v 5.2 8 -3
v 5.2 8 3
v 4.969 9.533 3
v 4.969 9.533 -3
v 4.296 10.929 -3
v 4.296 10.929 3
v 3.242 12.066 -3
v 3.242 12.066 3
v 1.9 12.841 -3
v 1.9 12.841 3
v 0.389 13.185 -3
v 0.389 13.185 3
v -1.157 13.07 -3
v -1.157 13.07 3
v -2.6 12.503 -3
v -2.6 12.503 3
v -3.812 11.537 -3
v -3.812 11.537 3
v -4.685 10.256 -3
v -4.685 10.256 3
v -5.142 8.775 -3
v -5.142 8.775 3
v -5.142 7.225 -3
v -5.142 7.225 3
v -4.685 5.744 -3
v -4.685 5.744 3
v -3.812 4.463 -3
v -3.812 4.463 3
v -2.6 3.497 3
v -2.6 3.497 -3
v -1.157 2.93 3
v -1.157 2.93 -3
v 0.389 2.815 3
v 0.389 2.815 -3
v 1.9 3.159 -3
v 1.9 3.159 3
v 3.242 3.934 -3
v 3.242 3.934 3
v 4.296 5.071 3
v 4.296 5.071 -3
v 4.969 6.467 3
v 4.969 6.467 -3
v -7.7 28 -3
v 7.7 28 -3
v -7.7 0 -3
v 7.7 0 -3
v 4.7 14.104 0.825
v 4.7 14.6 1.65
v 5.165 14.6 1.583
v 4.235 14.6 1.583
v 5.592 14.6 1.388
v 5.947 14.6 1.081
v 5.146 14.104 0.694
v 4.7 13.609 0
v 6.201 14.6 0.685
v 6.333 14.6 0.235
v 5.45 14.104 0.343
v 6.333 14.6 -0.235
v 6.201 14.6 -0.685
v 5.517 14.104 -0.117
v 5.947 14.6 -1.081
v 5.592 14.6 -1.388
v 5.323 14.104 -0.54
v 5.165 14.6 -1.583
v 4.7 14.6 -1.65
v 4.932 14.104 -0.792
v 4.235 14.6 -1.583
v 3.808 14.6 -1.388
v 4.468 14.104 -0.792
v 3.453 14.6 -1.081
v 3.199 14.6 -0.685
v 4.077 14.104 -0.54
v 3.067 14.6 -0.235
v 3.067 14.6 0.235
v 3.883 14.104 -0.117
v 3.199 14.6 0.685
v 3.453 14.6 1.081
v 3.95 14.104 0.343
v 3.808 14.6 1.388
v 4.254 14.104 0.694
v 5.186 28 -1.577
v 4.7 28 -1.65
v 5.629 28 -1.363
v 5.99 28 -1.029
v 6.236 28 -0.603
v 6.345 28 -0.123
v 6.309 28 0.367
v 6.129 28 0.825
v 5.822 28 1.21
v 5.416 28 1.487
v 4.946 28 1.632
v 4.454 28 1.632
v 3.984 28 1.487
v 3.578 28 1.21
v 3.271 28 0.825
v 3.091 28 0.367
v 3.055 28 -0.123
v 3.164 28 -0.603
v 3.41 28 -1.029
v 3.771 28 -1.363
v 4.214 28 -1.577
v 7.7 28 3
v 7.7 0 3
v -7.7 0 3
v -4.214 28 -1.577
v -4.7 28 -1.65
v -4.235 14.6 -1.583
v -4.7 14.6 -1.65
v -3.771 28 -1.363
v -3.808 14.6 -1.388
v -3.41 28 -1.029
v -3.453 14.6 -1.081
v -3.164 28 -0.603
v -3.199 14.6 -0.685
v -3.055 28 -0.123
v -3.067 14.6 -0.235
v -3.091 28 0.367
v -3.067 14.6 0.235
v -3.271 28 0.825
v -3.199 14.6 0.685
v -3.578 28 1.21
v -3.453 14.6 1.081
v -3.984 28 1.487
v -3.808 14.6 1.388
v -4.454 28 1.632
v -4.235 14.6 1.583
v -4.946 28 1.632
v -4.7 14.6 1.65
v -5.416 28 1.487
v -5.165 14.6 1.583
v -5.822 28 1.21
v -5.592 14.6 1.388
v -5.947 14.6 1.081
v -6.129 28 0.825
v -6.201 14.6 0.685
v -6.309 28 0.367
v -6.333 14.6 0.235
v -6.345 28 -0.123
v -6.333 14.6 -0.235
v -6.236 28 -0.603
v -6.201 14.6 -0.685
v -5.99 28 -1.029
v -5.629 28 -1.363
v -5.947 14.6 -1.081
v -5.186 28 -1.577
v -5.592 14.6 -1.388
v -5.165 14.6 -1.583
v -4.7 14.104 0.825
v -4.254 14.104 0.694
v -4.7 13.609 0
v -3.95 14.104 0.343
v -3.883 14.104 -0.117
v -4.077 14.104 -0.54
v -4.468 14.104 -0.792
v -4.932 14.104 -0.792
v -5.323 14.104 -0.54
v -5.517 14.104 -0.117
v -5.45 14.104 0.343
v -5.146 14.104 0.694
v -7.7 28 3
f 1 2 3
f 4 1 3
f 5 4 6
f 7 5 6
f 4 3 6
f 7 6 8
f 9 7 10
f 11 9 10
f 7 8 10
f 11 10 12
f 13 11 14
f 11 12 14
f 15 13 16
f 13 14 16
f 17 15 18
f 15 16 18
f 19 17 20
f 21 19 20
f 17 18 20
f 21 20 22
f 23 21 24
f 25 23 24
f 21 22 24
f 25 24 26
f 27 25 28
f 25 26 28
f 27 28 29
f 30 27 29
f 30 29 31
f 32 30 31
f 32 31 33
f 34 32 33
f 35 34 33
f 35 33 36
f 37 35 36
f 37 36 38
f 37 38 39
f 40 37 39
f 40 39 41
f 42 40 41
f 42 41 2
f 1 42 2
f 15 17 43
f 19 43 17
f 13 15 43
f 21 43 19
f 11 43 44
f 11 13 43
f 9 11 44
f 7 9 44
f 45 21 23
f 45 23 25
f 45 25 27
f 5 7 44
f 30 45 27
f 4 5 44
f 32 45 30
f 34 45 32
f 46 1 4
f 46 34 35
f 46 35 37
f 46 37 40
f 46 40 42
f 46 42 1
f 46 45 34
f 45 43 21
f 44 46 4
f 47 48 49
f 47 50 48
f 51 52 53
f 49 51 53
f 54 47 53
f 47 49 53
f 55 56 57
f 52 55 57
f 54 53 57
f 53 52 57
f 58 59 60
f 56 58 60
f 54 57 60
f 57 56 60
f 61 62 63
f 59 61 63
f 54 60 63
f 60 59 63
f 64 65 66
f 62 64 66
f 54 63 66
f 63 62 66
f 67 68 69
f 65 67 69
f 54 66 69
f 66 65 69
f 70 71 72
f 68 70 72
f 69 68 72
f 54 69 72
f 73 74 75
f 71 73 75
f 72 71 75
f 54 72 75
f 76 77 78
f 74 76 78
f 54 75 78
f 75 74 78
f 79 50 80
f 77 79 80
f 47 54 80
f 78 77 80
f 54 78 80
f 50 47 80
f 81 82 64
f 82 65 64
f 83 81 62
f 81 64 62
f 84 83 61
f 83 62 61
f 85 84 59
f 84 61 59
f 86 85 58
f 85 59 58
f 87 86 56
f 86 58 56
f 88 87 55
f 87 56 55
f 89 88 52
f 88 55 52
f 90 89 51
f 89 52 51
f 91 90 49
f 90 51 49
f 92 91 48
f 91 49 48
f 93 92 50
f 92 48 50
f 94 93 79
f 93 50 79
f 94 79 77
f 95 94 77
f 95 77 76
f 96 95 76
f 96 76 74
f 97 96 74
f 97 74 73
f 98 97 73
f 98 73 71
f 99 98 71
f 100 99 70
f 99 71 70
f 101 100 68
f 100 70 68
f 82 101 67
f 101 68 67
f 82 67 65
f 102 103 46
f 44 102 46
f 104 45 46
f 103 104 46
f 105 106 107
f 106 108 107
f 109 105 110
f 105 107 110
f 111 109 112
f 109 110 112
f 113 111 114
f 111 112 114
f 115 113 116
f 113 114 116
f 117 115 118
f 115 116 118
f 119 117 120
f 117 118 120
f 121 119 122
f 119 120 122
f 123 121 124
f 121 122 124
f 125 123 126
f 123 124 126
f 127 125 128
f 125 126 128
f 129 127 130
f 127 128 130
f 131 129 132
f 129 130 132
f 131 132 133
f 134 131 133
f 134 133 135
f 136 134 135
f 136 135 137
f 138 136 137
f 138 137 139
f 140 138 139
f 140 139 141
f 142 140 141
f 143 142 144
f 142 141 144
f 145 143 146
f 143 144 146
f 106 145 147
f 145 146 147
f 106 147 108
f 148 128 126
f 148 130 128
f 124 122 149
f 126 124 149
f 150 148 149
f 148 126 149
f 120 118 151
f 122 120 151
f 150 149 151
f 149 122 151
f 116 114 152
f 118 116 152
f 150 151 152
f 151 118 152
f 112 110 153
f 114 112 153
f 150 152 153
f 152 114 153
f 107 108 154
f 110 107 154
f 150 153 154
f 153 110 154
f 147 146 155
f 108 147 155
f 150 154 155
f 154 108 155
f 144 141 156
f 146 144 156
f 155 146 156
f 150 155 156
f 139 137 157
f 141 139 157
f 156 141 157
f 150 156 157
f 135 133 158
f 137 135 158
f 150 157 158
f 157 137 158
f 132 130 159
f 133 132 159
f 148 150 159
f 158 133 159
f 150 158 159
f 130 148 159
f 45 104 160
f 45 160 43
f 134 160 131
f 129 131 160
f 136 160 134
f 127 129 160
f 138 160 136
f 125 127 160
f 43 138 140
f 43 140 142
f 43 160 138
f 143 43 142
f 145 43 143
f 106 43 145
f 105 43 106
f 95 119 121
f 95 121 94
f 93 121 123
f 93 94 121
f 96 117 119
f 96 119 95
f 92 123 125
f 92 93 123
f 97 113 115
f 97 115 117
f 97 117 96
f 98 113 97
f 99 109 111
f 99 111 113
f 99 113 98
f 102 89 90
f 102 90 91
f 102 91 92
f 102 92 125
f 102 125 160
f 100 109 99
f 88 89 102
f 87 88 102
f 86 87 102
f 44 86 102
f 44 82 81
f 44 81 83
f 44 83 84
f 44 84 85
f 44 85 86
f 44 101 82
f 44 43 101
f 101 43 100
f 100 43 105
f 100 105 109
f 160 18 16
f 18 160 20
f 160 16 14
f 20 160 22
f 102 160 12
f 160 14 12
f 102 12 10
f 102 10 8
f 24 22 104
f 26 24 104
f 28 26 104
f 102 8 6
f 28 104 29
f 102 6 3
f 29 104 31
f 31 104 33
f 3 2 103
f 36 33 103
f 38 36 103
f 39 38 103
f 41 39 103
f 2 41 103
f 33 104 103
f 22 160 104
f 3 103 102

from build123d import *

# Parameters (mm, degrees)
SKETCH1_W                                     = 15.4
SKETCH1_H                                     = 6
BOSS_EXTRUDE1_DEPTH                           = 28
TAP_DRILL_FOR_M4X0_7_TAP1_D                   = 3.3
TAP_DRILL_FOR_M4X0_7_TAP1_DEPTH               = 13.4
TAP_DRILL_FOR_M4X0_7_TAP1_TIP                 = 0.991420021
CUT_EXTRUDE_PRESS_FIT_HOLE_FOR_SOLENOID_REACH = 31.653
SKETCH4_R                                     = 5.2


with BuildPart() as part:
    # Sketch1 → Boss-Extrude1 (new body)
    with BuildSketch(Plane(origin=(0, 0, 0), x_dir=(1, 0, 0), z_dir=(0, 1, 0))):
        Rectangle(SKETCH1_W, SKETCH1_H)
    extrude(amount=BOSS_EXTRUDE1_DEPTH)

    # Tap Drill for M4x0.7 Tap1
    with Locations(Plane(origin=(-4.7, 28, 0), x_dir=(0, 0, 1), z_dir=(0, 1, 0))):
        with Locations((0, 0), (0, 9.4)):
            Hole(TAP_DRILL_FOR_M4X0_7_TAP1_D / 2, depth=TAP_DRILL_FOR_M4X0_7_TAP1_DEPTH)
            with Locations((0, 0, -(TAP_DRILL_FOR_M4X0_7_TAP1_DEPTH + TAP_DRILL_FOR_M4X0_7_TAP1_TIP / 2))):  # 118° drill point
                Cone(0, TAP_DRILL_FOR_M4X0_7_TAP1_D / 2, TAP_DRILL_FOR_M4X0_7_TAP1_TIP, mode=Mode.SUBTRACT)

    # Sketch4 → Cut-Extrude Press Fit hole for solenoid tube (cut, up to next)
    with BuildSketch(Plane.XY.offset(3), mode=Mode.PRIVATE) as cut_extrude_press_fit_hole_for_solenoid_sk1:
        with Locations((0, 8)):
            Circle(SKETCH4_R)
    cut_extrude_press_fit_hole_for_solenoid_tool1 = extrude(cut_extrude_press_fit_hole_for_solenoid_sk1.sketch, amount=-CUT_EXTRUDE_PRESS_FIT_HOLE_FOR_SOLENOID_REACH, mode=Mode.PRIVATE) & part.part
    add(cut_extrude_press_fit_hole_for_solenoid_tool1.solids().sort_by_distance((0, 8, 3))[0], mode=Mode.SUBTRACT)


solid = part.part
